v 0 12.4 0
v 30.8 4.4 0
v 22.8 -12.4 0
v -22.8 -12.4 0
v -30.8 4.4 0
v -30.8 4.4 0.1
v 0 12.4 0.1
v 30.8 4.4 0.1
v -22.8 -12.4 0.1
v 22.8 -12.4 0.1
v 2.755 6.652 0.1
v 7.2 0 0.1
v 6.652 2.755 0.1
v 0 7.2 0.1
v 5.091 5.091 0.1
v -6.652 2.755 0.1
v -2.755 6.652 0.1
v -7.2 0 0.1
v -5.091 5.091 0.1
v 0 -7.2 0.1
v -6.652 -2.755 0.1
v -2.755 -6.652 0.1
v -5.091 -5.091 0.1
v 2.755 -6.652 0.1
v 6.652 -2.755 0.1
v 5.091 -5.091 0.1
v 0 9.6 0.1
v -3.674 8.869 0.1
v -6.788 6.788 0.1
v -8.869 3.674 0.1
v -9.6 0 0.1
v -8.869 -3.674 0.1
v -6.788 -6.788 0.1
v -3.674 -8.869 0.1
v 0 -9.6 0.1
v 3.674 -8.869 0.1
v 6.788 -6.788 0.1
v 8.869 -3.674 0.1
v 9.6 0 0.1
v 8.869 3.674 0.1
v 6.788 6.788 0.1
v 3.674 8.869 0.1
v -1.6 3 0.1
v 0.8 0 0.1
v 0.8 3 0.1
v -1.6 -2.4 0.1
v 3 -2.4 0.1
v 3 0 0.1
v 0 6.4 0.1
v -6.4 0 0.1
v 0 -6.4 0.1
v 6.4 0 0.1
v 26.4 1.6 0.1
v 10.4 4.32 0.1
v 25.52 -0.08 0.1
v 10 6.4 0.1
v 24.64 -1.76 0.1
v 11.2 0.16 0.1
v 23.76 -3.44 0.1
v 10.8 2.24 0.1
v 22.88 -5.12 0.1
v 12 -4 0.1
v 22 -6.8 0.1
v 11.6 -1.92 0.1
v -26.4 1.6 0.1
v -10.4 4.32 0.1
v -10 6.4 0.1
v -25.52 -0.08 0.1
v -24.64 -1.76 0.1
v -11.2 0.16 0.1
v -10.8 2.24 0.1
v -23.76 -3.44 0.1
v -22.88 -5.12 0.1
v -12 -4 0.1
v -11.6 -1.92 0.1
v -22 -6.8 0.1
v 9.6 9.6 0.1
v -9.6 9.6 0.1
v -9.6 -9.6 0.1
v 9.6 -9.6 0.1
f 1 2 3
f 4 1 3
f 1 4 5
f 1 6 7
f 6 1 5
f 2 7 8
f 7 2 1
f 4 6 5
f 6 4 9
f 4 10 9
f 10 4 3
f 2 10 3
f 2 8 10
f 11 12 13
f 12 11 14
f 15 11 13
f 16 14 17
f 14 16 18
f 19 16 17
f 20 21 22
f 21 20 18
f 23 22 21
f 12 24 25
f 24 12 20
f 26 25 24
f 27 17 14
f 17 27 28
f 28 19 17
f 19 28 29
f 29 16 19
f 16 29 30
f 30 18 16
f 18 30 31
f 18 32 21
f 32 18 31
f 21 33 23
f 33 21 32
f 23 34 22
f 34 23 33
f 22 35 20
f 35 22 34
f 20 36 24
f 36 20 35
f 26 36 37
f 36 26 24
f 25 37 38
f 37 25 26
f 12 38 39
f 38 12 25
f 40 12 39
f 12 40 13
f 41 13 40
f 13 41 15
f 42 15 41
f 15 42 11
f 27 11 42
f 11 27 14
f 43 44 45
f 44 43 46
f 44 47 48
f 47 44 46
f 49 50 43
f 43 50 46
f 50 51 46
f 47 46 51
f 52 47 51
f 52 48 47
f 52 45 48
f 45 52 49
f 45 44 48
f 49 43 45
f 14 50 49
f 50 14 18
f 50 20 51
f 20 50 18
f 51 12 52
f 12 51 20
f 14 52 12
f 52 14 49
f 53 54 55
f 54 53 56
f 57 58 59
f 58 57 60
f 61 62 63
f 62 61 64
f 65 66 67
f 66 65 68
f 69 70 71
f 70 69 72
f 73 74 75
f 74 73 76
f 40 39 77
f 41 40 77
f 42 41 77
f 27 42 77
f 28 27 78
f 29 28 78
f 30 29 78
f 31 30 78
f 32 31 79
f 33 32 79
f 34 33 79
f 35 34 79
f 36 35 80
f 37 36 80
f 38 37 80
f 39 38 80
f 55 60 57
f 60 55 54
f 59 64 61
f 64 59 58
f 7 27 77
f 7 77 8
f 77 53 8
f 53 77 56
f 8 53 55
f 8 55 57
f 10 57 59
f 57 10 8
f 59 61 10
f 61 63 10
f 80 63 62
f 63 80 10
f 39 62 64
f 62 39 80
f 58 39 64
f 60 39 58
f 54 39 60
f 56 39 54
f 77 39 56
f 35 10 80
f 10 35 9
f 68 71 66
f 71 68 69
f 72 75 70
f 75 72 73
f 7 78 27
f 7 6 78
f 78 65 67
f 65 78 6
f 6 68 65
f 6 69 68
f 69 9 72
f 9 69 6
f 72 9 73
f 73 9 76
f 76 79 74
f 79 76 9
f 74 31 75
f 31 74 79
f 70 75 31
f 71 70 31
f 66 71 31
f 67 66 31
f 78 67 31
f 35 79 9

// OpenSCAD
// file: ../p/4-4edge.scad
use <../lib.scad>
$fa=1; $fs=0.2;
function ldraw_lib__4_4edge(realsolid=false) = [
// 0 Circle 1.0
// 0 Name: 4-4edge.dat
// 0 Author: James Jessiman
// 0 !LDRAW_ORG Primitive UPDATE 2017-01
// 0 !LICENSE Licensed under CC BY 2.0 and CC BY 4.0 : see CAreadme.txt
// 
// 0 BFC CERTIFY CCW
  [0,"BFC","CERTIFY"],
  [0,"BFC","CCW"],
// 
// 0 !HISTORY 1998-12-15 [PTadmin] Official Update 1998-10
// 0 !HISTORY 2005-12-28 [PTadmin] Official Update 2005-01
// 0 !HISTORY 2007-06-24 [PTadmin] Header formatted for Contributor Agreement
// 0 !HISTORY 2008-07-01 [PTadmin] Official Update 2008-01
// 0 !HISTORY 2017-01-15 [Steffen] BFCed
// 0 !HISTORY 2017-12-30 [PTadmin] Official Update 2017-01
// 
// 
// 2 24 1 0 0 0.9239 0 0.3827
  [2,24,1,0,0,0.9239,0,0.3827],
// 2 24 0.9239 0 0.3827 0.7071 0 0.7071
  [2,24,0.9239,0,0.3827,0.7071,0,0.7071],
// 2 24 0.7071 0 0.7071 0.3827 0 0.9239
  [2,24,0.7071,0,0.7071,0.3827,0,0.9239],
// 2 24 0.3827 0 0.9239 0 0 1
  [2,24,0.3827,0,0.9239,0,0,1],
// 2 24 0 0 1 -0.3827 0 0.9239
  [2,24,0,0,1,-0.3827,0,0.9239],
// 2 24 -0.3827 0 0.9239 -0.7071 0 0.7071
  [2,24,-0.3827,0,0.9239,-0.7071,0,0.7071],
// 2 24 -0.7071 0 0.7071 -0.9239 0 0.3827
  [2,24,-0.7071,0,0.7071,-0.9239,0,0.3827],
// 2 24 -0.9239 0 0.3827 -1 0 -0
  [2,24,-0.9239,0,0.3827,-1,0,-0],
// 2 24 -1 0 -0 -0.9239 0 -0.3827
  [2,24,-1,0,-0,-0.9239,0,-0.3827],
// 2 24 -0.9239 0 -0.3827 -0.7071 0 -0.7071
  [2,24,-0.9239,0,-0.3827,-0.7071,0,-0.7071],
// 2 24 -0.7071 0 -0.7071 -0.3827 0 -0.9239
  [2,24,-0.7071,0,-0.7071,-0.3827,0,-0.9239],
// 2 24 -0.3827 0 -0.9239 0 0 -1
  [2,24,-0.3827,0,-0.9239,0,0,-1],
// 2 24 0 0 -1 0.3827 0 -0.9239
  [2,24,0,0,-1,0.3827,0,-0.9239],
// 2 24 0.3827 0 -0.9239 0.7071 0 -0.7071
  [2,24,0.3827,0,-0.9239,0.7071,0,-0.7071],
// 2 24 0.7071 0 -0.7071 0.9239 0 -0.3827
  [2,24,0.7071,0,-0.7071,0.9239,0,-0.3827],
// 2 24 0.9239 0 -0.3827 1 0 0
  [2,24,0.9239,0,-0.3827,1,0,0],
];
module ldraw_lib__4_4edge(step=0, col=false, unit=2/5, alt=false, line=0.2, solid=!$preview)
    makepoly(ldraw_lib__4_4edge(solid), step=step, col=col, unit=unit, alt=alt, line=line, solid=solid);
ldraw_lib__4_4edge(line=0.2);
// file: ../p/4-4disc.scad
use <../lib.scad>
$fa=1; $fs=0.2;
function ldraw_lib__4_4disc(realsolid=false) = [
// 0 Disc 1.0
// 0 Name: 4-4disc.dat
// 0 Author: James Jessiman
// 0 !LDRAW_ORG Primitive UPDATE 2002-02
// 0 !LICENSE Licensed under CC BY 2.0 and CC BY 4.0 : see CAreadme.txt
// 
// 0 BFC CERTIFY CCW
  [0,"BFC","CERTIFY"],
  [0,"BFC","CCW"],
// 
// 0 !HISTORY 1998-12-15 [PTadmin] Official Update 1998-10
// 0 !HISTORY 2002-03-23 [sbliss] Added BFC statement
// 0 !HISTORY 2002-04-25 [PTadmin] Official Update 2002-02
// 0 !HISTORY 2007-06-24 [PTadmin] Header formatted for Contributor Agreement
// 0 !HISTORY 2008-07-01 [PTadmin] Official Update 2008-01
// 
// 
// 3 16 0 0 0 1 0 0 0.9239 0 0.3827
  [3,16,0,0,0,1,0,0,0.9239,0,0.3827],
// 3 16 0 0 0 0.9239 0 0.3827 0.7071 0 0.7071
  [3,16,0,0,0,0.9239,0,0.3827,0.7071,0,0.7071],
// 3 16 0 0 0 0.7071 0 0.7071 0.3827 0 0.9239
  [3,16,0,0,0,0.7071,0,0.7071,0.3827,0,0.9239],
// 3 16 0 0 0 0.3827 0 0.9239 0 0 1
  [3,16,0,0,0,0.3827,0,0.9239,0,0,1],
// 3 16 0 0 0 0 0 1 -0.3827 0 0.9239
  [3,16,0,0,0,0,0,1,-0.3827,0,0.9239],
// 3 16 0 0 0 -0.3827 0 0.9239 -0.7071 0 0.7071
  [3,16,0,0,0,-0.3827,0,0.9239,-0.7071,0,0.7071],
// 3 16 0 0 0 -0.7071 0 0.7071 -0.9239 0 0.3827
  [3,16,0,0,0,-0.7071,0,0.7071,-0.9239,0,0.3827],
// 3 16 0 0 0 -0.9239 0 0.3827 -1 0 -0
  [3,16,0,0,0,-0.9239,0,0.3827,-1,0,-0],
// 3 16 0 0 0 -1 0 -0 -0.9239 0 -0.3827
  [3,16,0,0,0,-1,0,-0,-0.9239,0,-0.3827],
// 3 16 0 0 0 -0.9239 0 -0.3827 -0.7071 0 -0.7071
  [3,16,0,0,0,-0.9239,0,-0.3827,-0.7071,0,-0.7071],
// 3 16 0 0 0 -0.7071 0 -0.7071 -0.3827 0 -0.9239
  [3,16,0,0,0,-0.7071,0,-0.7071,-0.3827,0,-0.9239],
// 3 16 0 0 0 -0.3827 0 -0.9239 0 0 -1
  [3,16,0,0,0,-0.3827,0,-0.9239,0,0,-1],
// 3 16 0 0 0 0 0 -1 0.3827 0 -0.9239
  [3,16,0,0,0,0,0,-1,0.3827,0,-0.9239],
// 3 16 0 0 0 0.3827 0 -0.9239 0.7071 0 -0.7071
  [3,16,0,0,0,0.3827,0,-0.9239,0.7071,0,-0.7071],
// 3 16 0 0 0 0.7071 0 -0.7071 0.9239 0 -0.3827
  [3,16,0,0,0,0.7071,0,-0.7071,0.9239,0,-0.3827],
// 3 16 0 0 0 0.9239 0 -0.3827 1 0 0
  [3,16,0,0,0,0.9239,0,-0.3827,1,0,0],
// 0
];
module ldraw_lib__4_4disc(step=0, col=false, unit=2/5, alt=false, line=0.2, solid=!$preview)
    makepoly(ldraw_lib__4_4disc(solid), step=step, col=col, unit=unit, alt=alt, line=line, solid=solid);
ldraw_lib__4_4disc(line=0.2);
// file: ../p/4-4cyli.scad
use <../lib.scad>
$fa=1; $fs=0.2;
function ldraw_lib__4_4cyli(realsolid=false) = [
// 0 Cylinder 1.0
// 0 Name: 4-4cyli.dat
// 0 Author: James Jessiman
// 0 !LDRAW_ORG Primitive UPDATE 2005-01
// 0 !LICENSE Licensed under CC BY 2.0 and CC BY 4.0 : see CAreadme.txt
// 
// 0 BFC CERTIFY CCW
  [0,"BFC","CERTIFY"],
  [0,"BFC","CCW"],
// 
// 0 !HISTORY 1998-12-15 [PTadmin] Official Update 1998-10
// 0 !HISTORY 2002-03-23 [sbliss] Added BFC statement; merged headers from files in distributions LDraw 0.27 and Complete.
// 0 !HISTORY 2002-04-25 [PTadmin] Official Update 2002-02
// 0 !HISTORY 2004-12-14 [guyvivan] BFC CCW
// 0 !HISTORY 2005-12-28 [PTadmin] Official Update 2005-01
// 0 !HISTORY 2007-06-24 [PTadmin] Header formatted for Contributor Agreement
// 0 !HISTORY 2008-07-01 [PTadmin] Official Update 2008-01
// 
// 
// 4 16 1 1 0 0.9239 1 0.3827 0.9239 0 0.3827 1 0 0
  [4,16,1,1,0,0.9239,1,0.3827,0.9239,0,0.3827,1,0,0],
// 5 24 1 0 0 1 1 0 0.9239 0 0.3827 0.9239 0 -0.3827
  [5,24,1,0,0,1,1,0,0.9239,0,0.3827,0.9239,0,-0.3827],
// 4 16 0.9239 1 0.3827 0.7071 1 0.7071 0.7071 0 0.7071 0.9239 0 0.3827
  [4,16,0.9239,1,0.3827,0.7071,1,0.7071,0.7071,0,0.7071,0.9239,0,0.3827],
// 5 24 0.9239 0 0.3827 0.9239 1 0.3827 0.7071 0 0.7071 1 0 0
  [5,24,0.9239,0,0.3827,0.9239,1,0.3827,0.7071,0,0.7071,1,0,0],
// 4 16 0.7071 1 0.7071 0.3827 1 0.9239 0.3827 0 0.9239 0.7071 0 0.7071
  [4,16,0.7071,1,0.7071,0.3827,1,0.9239,0.3827,0,0.9239,0.7071,0,0.7071],
// 5 24 0.7071 0 0.7071 0.7071 1 0.7071 0.3827 0 0.9239 0.9239 0 0.3827
  [5,24,0.7071,0,0.7071,0.7071,1,0.7071,0.3827,0,0.9239,0.9239,0,0.3827],
// 4 16 0.3827 1 0.9239 0 1 1 0 0 1 0.3827 0 0.9239
  [4,16,0.3827,1,0.9239,0,1,1,0,0,1,0.3827,0,0.9239],
// 5 24 0.3827 0 0.9239 0.3827 1 0.9239 0 0 1 0.7071 0 0.7071
  [5,24,0.3827,0,0.9239,0.3827,1,0.9239,0,0,1,0.7071,0,0.7071],
// 4 16 0 1 1 -0.3827 1 0.9239 -0.3827 0 0.9239 0 0 1
  [4,16,0,1,1,-0.3827,1,0.9239,-0.3827,0,0.9239,0,0,1],
// 5 24 0 0 1 0 1 1 -0.3827 0 0.9239 0.3827 0 0.9239
  [5,24,0,0,1,0,1,1,-0.3827,0,0.9239,0.3827,0,0.9239],
// 4 16 -0.3827 1 0.9239 -0.7071 1 0.7071 -0.7071 0 0.7071 -0.3827 0 0.9239
  [4,16,-0.3827,1,0.9239,-0.7071,1,0.7071,-0.7071,0,0.7071,-0.3827,0,0.9239],
// 5 24 -0.3827 0 0.9239 -0.3827 1 0.9239 -0.7071 0 0.7071 0 0 1
  [5,24,-0.3827,0,0.9239,-0.3827,1,0.9239,-0.7071,0,0.7071,0,0,1],
// 4 16 -0.7071 1 0.7071 -0.9239 1 0.3827 -0.9239 0 0.3827 -0.7071 0 0.7071
  [4,16,-0.7071,1,0.7071,-0.9239,1,0.3827,-0.9239,0,0.3827,-0.7071,0,0.7071],
// 5 24 -0.7071 0 0.7071 -0.7071 1 0.7071 -0.9239 0 0.3827 -0.3827 0 0.9239
  [5,24,-0.7071,0,0.7071,-0.7071,1,0.7071,-0.9239,0,0.3827,-0.3827,0,0.9239],
// 4 16 -0.9239 1 0.3827 -1 1 0 -1 0 0 -0.9239 0 0.3827
  [4,16,-0.9239,1,0.3827,-1,1,0,-1,0,0,-0.9239,0,0.3827],
// 5 24 -0.9239 0 0.3827 -0.9239 1 0.3827 -1 0 0 -0.7071 0 0.7071
  [5,24,-0.9239,0,0.3827,-0.9239,1,0.3827,-1,0,0,-0.7071,0,0.7071],
// 4 16 -1 1 0 -0.9239 1 -0.3827 -0.9239 0 -0.3827 -1 0 0
  [4,16,-1,1,0,-0.9239,1,-0.3827,-0.9239,0,-0.3827,-1,0,0],
// 5 24 -1 0 0 -1 1 0 -0.9239 0 -0.3827 -0.9239 0 0.3827
  [5,24,-1,0,0,-1,1,0,-0.9239,0,-0.3827,-0.9239,0,0.3827],
// 4 16 -0.9239 1 -0.3827 -0.7071 1 -0.7071 -0.7071 0 -0.7071 -0.9239 0 -0.3827
  [4,16,-0.9239,1,-0.3827,-0.7071,1,-0.7071,-0.7071,0,-0.7071,-0.9239,0,-0.3827],
// 5 24 -0.9239 0 -0.3827 -0.9239 1 -0.3827 -0.7071 0 -0.7071 -1 0 0
  [5,24,-0.9239,0,-0.3827,-0.9239,1,-0.3827,-0.7071,0,-0.7071,-1,0,0],
// 4 16 -0.7071 1 -0.7071 -0.3827 1 -0.9239 -0.3827 0 -0.9239 -0.7071 0 -0.7071
  [4,16,-0.7071,1,-0.7071,-0.3827,1,-0.9239,-0.3827,0,-0.9239,-0.7071,0,-0.7071],
// 5 24 -0.7071 0 -0.7071 -0.7071 1 -0.7071 -0.3827 0 -0.9239 -0.9239 0 -0.3827
  [5,24,-0.7071,0,-0.7071,-0.7071,1,-0.7071,-0.3827,0,-0.9239,-0.9239,0,-0.3827],
// 4 16 -0.3827 1 -0.9239 0 1 -1 0 0 -1 -0.3827 0 -0.9239
  [4,16,-0.3827,1,-0.9239,0,1,-1,0,0,-1,-0.3827,0,-0.9239],
// 5 24 -0.3827 0 -0.9239 -0.3827 1 -0.9239 0 0 -1 -0.7071 0 -0.7071
  [5,24,-0.3827,0,-0.9239,-0.3827,1,-0.9239,0,0,-1,-0.7071,0,-0.7071],
// 4 16 0 1 -1 0.3827 1 -0.9239 0.3827 0 -0.9239 0 0 -1
  [4,16,0,1,-1,0.3827,1,-0.9239,0.3827,0,-0.9239,0,0,-1],
// 5 24 0 0 -1 0 1 -1 0.3827 0 -0.9239 -0.3827 0 -0.9239
  [5,24,0,0,-1,0,1,-1,0.3827,0,-0.9239,-0.3827,0,-0.9239],
// 4 16 0.3827 1 -0.9239 0.7071 1 -0.7071 0.7071 0 -0.7071 0.3827 0 -0.9239
  [4,16,0.3827,1,-0.9239,0.7071,1,-0.7071,0.7071,0,-0.7071,0.3827,0,-0.9239],
// 5 24 0.3827 0 -0.9239 0.3827 1 -0.9239 0.7071 0 -0.7071 0 0 -1
  [5,24,0.3827,0,-0.9239,0.3827,1,-0.9239,0.7071,0,-0.7071,0,0,-1],
// 4 16 0.7071 1 -0.7071 0.9239 1 -0.3827 0.9239 0 -0.3827 0.7071 0 -0.7071
  [4,16,0.7071,1,-0.7071,0.9239,1,-0.3827,0.9239,0,-0.3827,0.7071,0,-0.7071],
// 5 24 0.7071 0 -0.7071 0.7071 1 -0.7071 0.9239 0 -0.3827 0.3827 0 -0.9239
  [5,24,0.7071,0,-0.7071,0.7071,1,-0.7071,0.9239,0,-0.3827,0.3827,0,-0.9239],
// 4 16 0.9239 1 -0.3827 1 1 0 1 0 0 0.9239 0 -0.3827
  [4,16,0.9239,1,-0.3827,1,1,0,1,0,0,0.9239,0,-0.3827],
// 5 24 0.9239 0 -0.3827 0.9239 1 -0.3827 1 0 0 0.7071 0 -0.7071
  [5,24,0.9239,0,-0.3827,0.9239,1,-0.3827,1,0,0,0.7071,0,-0.7071],
// 0
];
module ldraw_lib__4_4cyli(step=0, col=false, unit=2/5, alt=false, line=0.2, solid=!$preview)
    makepoly(ldraw_lib__4_4cyli(solid), step=step, col=col, unit=unit, alt=alt, line=line, solid=solid);
ldraw_lib__4_4cyli(line=0.2);
// file: ../p/stud3.scad
use <../lib.scad>
use <4-4cyli.scad>
use <4-4disc.scad>
use <4-4edge.scad>
$fa=1; $fs=0.2;
function ldraw_lib__stud3(realsolid=false) = realsolid ? 
    [openscad(translate([0,0,-eps()], o=cylinder(4+eps(), r=4)),2)] : [
// 0 Stud Tube Solid
// 0 Name: stud3.dat
// 0 Author: James Jessiman
// 0 !LDRAW_ORG Primitive UPDATE 2012-01
// 0 !LICENSE Licensed under CC BY 2.0 and CC BY 4.0 : see CAreadme.txt
// 
// 0 BFC CERTIFY CCW
  [0,"BFC","CERTIFY"],
  [0,"BFC","CCW"],
// 
// 0 !HISTORY 2002-04-04 [sbliss] Modified for BFC compliance
// 0 !HISTORY 2002-04-25 [PTadmin] Official Update 2002-02
// 0 !HISTORY 2007-06-24 [PTadmin] Header formatted for Contributor Agreement
// 0 !HISTORY 2008-07-01 [PTadmin] Official Update 2008-01
// 0 !HISTORY 2012-02-16 [Philo] Changed to CCW
// 0 !HISTORY 2012-03-30 [PTadmin] Official Update 2012-01
// 
// 
// 1 16 0 -4 0 4 0 0 0 1 0 0 0 4 4-4edge.dat
  [1,16,0,-4,0,4,0,0,0,1,0,0,0,4, ldraw_lib__4_4edge(realsolid)],
// 1 16 0 0 0 4 0 0 0 1 0 0 0 4 4-4edge.dat
  [1,16,0,0,0,4,0,0,0,1,0,0,0,4, ldraw_lib__4_4edge(realsolid)],
// 1 16 0 -4 0 4 0 0 0 1 0 0 0 4 4-4disc.dat
  [1,16,0,-4,0,4,0,0,0,1,0,0,0,4, ldraw_lib__4_4disc(realsolid)],
// 1 16 0 -4 0 4 0 0 0 4 0 0 0 4 4-4cyli.dat
  [1,16,0,-4,0,4,0,0,0,4,0,0,0,4, ldraw_lib__4_4cyli(realsolid)],
];
module ldraw_lib__stud3(step=0, col=false, unit=2/5, alt=false, line=0.2, solid=!$preview)
    makepoly(ldraw_lib__stud3(solid), step=step, col=col, unit=unit, alt=alt, line=line, solid=solid);
ldraw_lib__stud3(line=0.2);
// file: ../p/stud.scad
use <../lib.scad>
use <4-4cyli.scad>
use <4-4disc.scad>
use <4-4edge.scad>
$fa=1; $fs=0.2;
function ldraw_lib__stud(realsolid=false) = realsolid ? 
    [openscad(translate([0,0,-eps()], o=cylinder(4+eps(), r=6)),2)] : [
// 0 Stud
// 0 Name: stud.dat
// 0 Author: James Jessiman
// 0 !LDRAW_ORG Primitive UPDATE 2012-01
// 0 !LICENSE Licensed under CC BY 2.0 and CC BY 4.0 : see CAreadme.txt
// 
// 0 BFC CERTIFY CCW
  [0,"BFC","CERTIFY"],
  [0,"BFC","CCW"],
// 
// 0 !HISTORY 2002-04-04 [sbliss] Modified for BFC compliance
// 0 !HISTORY 2002-04-25 [PTadmin] Official Update 2002-02
// 0 !HISTORY 2007-06-24 [PTadmin] Header formatted for Contributor Agreement
// 0 !HISTORY 2008-07-01 [PTadmin] Official Update 2008-01
// 0 !HISTORY 2012-02-16 [Philo] Changed to CCW
// 0 !HISTORY 2012-03-30 [PTadmin] Official Update 2012-01
// 
// 
// 1 16 0 0 0 6 0 0 0 1 0 0 0 6 4-4edge.dat
  [1,16,0,0,0,6,0,0,0,1,0,0,0,6, ldraw_lib__4_4edge(realsolid)],
// 1 16 0 -4 0 6 0 0 0 1 0 0 0 6 4-4edge.dat
  [1,16,0,-4,0,6,0,0,0,1,0,0,0,6, ldraw_lib__4_4edge(realsolid)],
// 1 16 0 0 0 6 0 0 0 -4 0 0 0 6 4-4cyli.dat
  [1,16,0,0,0,6,0,0,0,-4,0,0,0,6, ldraw_lib__4_4cyli(realsolid)],
// 1 16 0 -4 0 6 0 0 0 1 0 0 0 6 4-4disc.dat
  [1,16,0,-4,0,6,0,0,0,1,0,0,0,6, ldraw_lib__4_4disc(realsolid)],
];
module ldraw_lib__stud(step=0, col=false, unit=2/5, alt=false, line=0.2, solid=!$preview)
    makepoly(ldraw_lib__stud(solid), step=step, col=col, unit=unit, alt=alt, line=line, solid=solid);
ldraw_lib__stud(line=0.2);
// file: ../p/box5.scad
use <../lib.scad>
$fa=1; $fs=0.2;
function ldraw_lib__box5(realsolid=false) = [
// 0 Box with 5 Faces and All Edges
// 0 Name: box5.dat
// 0 Author: James Jessiman
// 0 !LDRAW_ORG Primitive UPDATE 2012-01
// 0 !LICENSE Licensed under CC BY 2.0 and CC BY 4.0 : see CAreadme.txt
// 
// 0 BFC CERTIFY CCW
  [0,"BFC","CERTIFY"],
  [0,"BFC","CCW"],
// 
// 0 !HISTORY 2002-04-03 [sbliss] Modified for BFC compliance
// 0 !HISTORY 2002-04-25 [PTadmin] Official Update 2002-02
// 0 !HISTORY 2007-06-24 [PTadmin] Header formatted for Contributor Agreement
// 0 !HISTORY 2008-07-01 [PTadmin] Official Update 2008-01
// 0 !HISTORY 2012-02-16 [Philo] Changed to CCW
// 0 !HISTORY 2012-03-30 [PTadmin] Official Update 2012-01
// 
// 
// 2 24 1 1 1 -1 1 1
  [2,24,1,1,1,-1,1,1],
// 2 24 -1 1 1 -1 1 -1
  [2,24,-1,1,1,-1,1,-1],
// 2 24 -1 1 -1 1 1 -1
  [2,24,-1,1,-1,1,1,-1],
// 2 24 1 1 -1 1 1 1
  [2,24,1,1,-1,1,1,1],
// 2 24 1 0 1 -1 0 1
  [2,24,1,0,1,-1,0,1],
// 2 24 -1 0 1 -1 0 -1
  [2,24,-1,0,1,-1,0,-1],
// 2 24 -1 0 -1 1 0 -1
  [2,24,-1,0,-1,1,0,-1],
// 2 24 1 0 -1 1 0 1
  [2,24,1,0,-1,1,0,1],
// 2 24 1 0 1 1 1 1
  [2,24,1,0,1,1,1,1],
// 2 24 -1 0 1 -1 1 1
  [2,24,-1,0,1,-1,1,1],
// 2 24 1 0 -1 1 1 -1
  [2,24,1,0,-1,1,1,-1],
// 2 24 -1 0 -1 -1 1 -1
  [2,24,-1,0,-1,-1,1,-1],
// 4 16 -1 1 1 1 1 1 1 1 -1 -1 1 -1
  [4,16,-1,1,1,1,1,1,1,1,-1,-1,1,-1],
// 4 16 -1 1 1 -1 0 1 1 0 1 1 1 1
  [4,16,-1,1,1,-1,0,1,1,0,1,1,1,1],
// 4 16 -1 1 -1 -1 0 -1 -1 0 1 -1 1 1
  [4,16,-1,1,-1,-1,0,-1,-1,0,1,-1,1,1],
// 4 16 1 1 -1 1 0 -1 -1 0 -1 -1 1 -1
  [4,16,1,1,-1,1,0,-1,-1,0,-1,-1,1,-1],
// 4 16 1 1 1 1 0 1 1 0 -1 1 1 -1
  [4,16,1,1,1,1,0,1,1,0,-1,1,1,-1],
];
module ldraw_lib__box5(step=0, col=false, unit=2/5, alt=false, line=0.2, solid=!$preview)
    makepoly(ldraw_lib__box5(solid), step=step, col=col, unit=unit, alt=alt, line=line, solid=solid);
ldraw_lib__box5(line=0.2);
// file: ../p/box4t.scad
use <../lib.scad>
$fa=1; $fs=0.2;
function ldraw_lib__box4t(realsolid=false) = [
// 0 Box with 4 Adjacent Faces and All Edges
// 0 Name: box4t.dat
// 0 Author: Tore Eriksson [Tore_Eriksson]
// 0 !LDRAW_ORG Primitive UPDATE 2003-02
// 0 !LICENSE Licensed under CC BY 2.0 and CC BY 4.0 : see CAreadme.txt
// 
// 0 BFC CERTIFY CCW
  [0,"BFC","CERTIFY"],
  [0,"BFC","CCW"],
// 
// 0 !HISTORY 1997-09-29 [PTadmin] Official Update 1997-15
// 0 !HISTORY 2002-08-31 [izanette] Modified with WINDZ for BFC compliance
// 0 !HISTORY 2003-08-01 [PTadmin] Official Update 2003-02
// 0 !HISTORY 2007-06-24 [PTadmin] Header formatted for Contributor Agreement
// 0 !HISTORY 2008-07-01 [PTadmin] Official Update 2008-01
// 
// 
// 2 24 1 1 1 -1 1 1
  [2,24,1,1,1,-1,1,1],
// 2 24 -1 1 1 -1 1 -1
  [2,24,-1,1,1,-1,1,-1],
// 2 24 -1 1 -1 1 1 -1
  [2,24,-1,1,-1,1,1,-1],
// 2 24 1 1 -1 1 1 1
  [2,24,1,1,-1,1,1,1],
// 2 24 1 0 1 -1 0 1
  [2,24,1,0,1,-1,0,1],
// 2 24 -1 0 1 -1 0 -1
  [2,24,-1,0,1,-1,0,-1],
// 2 24 -1 0 -1 1 0 -1
  [2,24,-1,0,-1,1,0,-1],
// 2 24 1 0 -1 1 0 1
  [2,24,1,0,-1,1,0,1],
// 2 24 1 0 1 1 1 1
  [2,24,1,0,1,1,1,1],
// 2 24 -1 0 1 -1 1 1
  [2,24,-1,0,1,-1,1,1],
// 2 24 1 0 -1 1 1 -1
  [2,24,1,0,-1,1,1,-1],
// 2 24 -1 0 -1 -1 1 -1
  [2,24,-1,0,-1,-1,1,-1],
// 4 16 1 1 1 1 1 -1 -1 1 -1 -1 1 1
  [4,16,1,1,1,1,1,-1,-1,1,-1,-1,1,1],
// 4 16 1 1 1 -1 1 1 -1 0 1 1 0 1
  [4,16,1,1,1,-1,1,1,-1,0,1,1,0,1],
// 4 16 -1 1 1 -1 1 -1 -1 0 -1 -1 0 1
  [4,16,-1,1,1,-1,1,-1,-1,0,-1,-1,0,1],
// 0 4 16 -1 1 -1 -1 0 -1 1 0 -1 1 1 -1
// 4 16 1 1 -1 1 1 1 1 0 1 1 0 -1
  [4,16,1,1,-1,1,1,1,1,0,1,1,0,-1],
// 0
];
module ldraw_lib__box4t(step=0, col=false, unit=2/5, alt=false, line=0.2, solid=!$preview)
    makepoly(ldraw_lib__box4t(solid), step=step, col=col, unit=unit, alt=alt, line=line, solid=solid);
ldraw_lib__box4t(line=0.2);
// file: s/3004s01.scad
use <../../lib.scad>
use <../../p/box4t.scad>
use <../../p/box5.scad>
use <../../p/stud.scad>
use <../../p/stud3.scad>
$fa=1; $fs=0.2;
function ldraw_lib__s__3004s01(realsolid=false) = [
// 0 ~Brick  1 x  2 without Front Face
// 0 Name: s\3004s01.dat
// 0 Author: James Jessiman
// 0 !LDRAW_ORG Subpart UPDATE 2003-03
// 0 !LICENSE Licensed under CC BY 2.0 and CC BY 4.0 : see CAreadme.txt
// 
// 0 BFC CERTIFY CCW
  [0,"BFC","CERTIFY"],
  [0,"BFC","CCW"],
// 
// 0 !HISTORY 2003-09-07 [jriley] Subfiling, BFC
// 0 !HISTORY 2003-12-19 [PTadmin] Official Update 2003-03
// 0 !HISTORY 2007-08-29 [PTadmin] Header formatted for Contributor Agreement
// 0 !HISTORY 2008-07-01 [PTadmin] Official Update 2008-01
// 
// 
// 1 16 0 4 0 1 0 0 0 -5 0 0 0 1 stud3.dat
  [1,16,0,4,0,1,0,0,0,-5,0,0,0,1, ldraw_lib__stud3(realsolid)],
// 0 BFC INVERTNEXT
  [0,"BFC","INVERTNEXT"],
// 1 16 0 24 0 16 0 0 0 -20 0 0 0 6 box5.dat
  [1,16,0,24,0,16,0,0,0,-20,0,0,0,6, ldraw_lib__box5(realsolid)],
// 4 16 20 24 10 16 24 6 -16 24 6 -20 24 10
  [4,16,20,24,10,16,24,6,-16,24,6,-20,24,10],
// 4 16 -20 24 10 -16 24 6 -16 24 -6 -20 24 -10
  [4,16,-20,24,10,-16,24,6,-16,24,-6,-20,24,-10],
// 4 16 -20 24 -10 -16 24 -6 16 24 -6 20 24 -10
  [4,16,-20,24,-10,-16,24,-6,16,24,-6,20,24,-10],
// 4 16 20 24 -10 16 24 -6 16 24 6 20 24 10
  [4,16,20,24,-10,16,24,-6,16,24,6,20,24,10],
// 1 16 0 24 0 20 0 0 0 -24 0 0 0 10 box4t.dat
  [1,16,0,24,0,20,0,0,0,-24,0,0,0,10, ldraw_lib__box4t(realsolid)],
// 1 16 10 0 0 1 0 0 0 1 0 0 0 1 stud.dat
  [1,16,10,0,0,1,0,0,0,1,0,0,0,1, ldraw_lib__stud(realsolid)],
// 1 16 -10 0 0 1 0 0 0 1 0 0 0 1 stud.dat
  [1,16,-10,0,0,1,0,0,0,1,0,0,0,1, ldraw_lib__stud(realsolid)],
// 0
];
module ldraw_lib__s__3004s01(step=0, col=false, unit=2/5, alt=false, line=0.2, solid=!$preview)
    makepoly(ldraw_lib__s__3004s01(solid), step=step, col=col, unit=unit, alt=alt, line=line, solid=solid);
ldraw_lib__s__3004s01(line=0.2);
// file: 3004.scad
use <../lib.scad>
use <s/3004s01.scad>
$fa=1; $fs=0.2;
function ldraw_lib__3004(realsolid=false) = [
// 0 Brick  1 x  2
// 0 Name: 3004.dat
// 0 Author: James Jessiman
// 0 !LDRAW_ORG Part UPDATE 2022-05
// 0 !LICENSE Licensed under CC BY 2.0 and CC BY 4.0 : see CAreadme.txt
// 
// 0 BFC CERTIFY CCW
  [0,"BFC","CERTIFY"],
  [0,"BFC","CCW"],
// 
// 0 !HISTORY 2001-10-26 [PTadmin] Official Update 2001-01
// 0 !HISTORY 2002-05-07 {unknown} BFC Certification
// 0 !HISTORY 2002-06-11 [PTadmin] Official Update 2002-03
// 0 !HISTORY 2007-05-07 [PTadmin] Header formatted for Contributor Agreement
// 0 !HISTORY 2008-07-01 [PTadmin] Official Update 2008-01
// 0 !HISTORY 2022-08-04 [MagFors] Using subfile
// 0 !HISTORY 2022-09-15 [PTadmin] Official Update 2022-05
// 
// 
// 1 16 0 0 0 1 0 0 0 1 0 0 0 1 s\3004s01.dat
  [1,16,0,0,0,1,0,0,0,1,0,0,0,1, ldraw_lib__s__3004s01(realsolid)],
// 4 16 -20 24 -10 20 24 -10 20 0 -10 -20 0 -10
  [4,16,-20,24,-10,20,24,-10,20,0,-10,-20,0,-10],
];
module ldraw_lib__3004(step=0, col=false, unit=2/5, alt=false, line=0.2, solid=!$preview)
    makepoly(ldraw_lib__3004(solid), step=step, col=col, unit=unit, alt=alt, line=line, solid=solid);
ldraw_lib__3004(line=0.2);
// file: ../p/4-4ring3.scad
use <../lib.scad>
$fa=1; $fs=0.2;
function ldraw_lib__4_4ring3(realsolid=false) = [
// 0 Ring  3 x 1.0
// 0 Name: 4-4ring3.dat
// 0 Author: James Jessiman
// 0 !LDRAW_ORG Primitive UPDATE 2009-01
// 0 !LICENSE Licensed under CC BY 2.0 and CC BY 4.0 : see CAreadme.txt
// 
// 0 BFC CERTIFY CCW
  [0,"BFC","CERTIFY"],
  [0,"BFC","CCW"],
// 
// 0 !HISTORY 1998-12-15 [PTadmin] Official Update 1998-10
// 0 !HISTORY 2002-04-05 [hafhead] Added BFC statement
// 0 !HISTORY 2002-04-25 [PTadmin] Official Update 2002-02
// 0 !HISTORY 2007-06-24 [PTadmin] Header formatted for Contributor Agreement
// 0 !HISTORY 2008-07-01 [PTadmin] Official Update 2008-01
// 0 !HISTORY 2008-08-26 [cwdee] Switch polygon winding and rename
// 0 !HISTORY 2009-05-02 [PTadmin] Official Update 2009-01
// 
// 
// 4 16 -1.5308 0 3.6956 -1.1481 0 2.7717 0 0 3 0 0 4
  [4,16,-1.5308,0,3.6956,-1.1481,0,2.7717,0,0,3,0,0,4],
// 4 16 -2.8284 0 2.8284 -2.1213 0 2.1213 -1.1481 0 2.7717 -1.5308 0 3.6956
  [4,16,-2.8284,0,2.8284,-2.1213,0,2.1213,-1.1481,0,2.7717,-1.5308,0,3.6956],
// 4 16 -3.6956 0 1.5308 -2.7717 0 1.1481 -2.1213 0 2.1213 -2.8284 0 2.8284
  [4,16,-3.6956,0,1.5308,-2.7717,0,1.1481,-2.1213,0,2.1213,-2.8284,0,2.8284],
// 4 16 -4 0 0 -3 0 0 -2.7717 0 1.1481 -3.6956 0 1.5308
  [4,16,-4,0,0,-3,0,0,-2.7717,0,1.1481,-3.6956,0,1.5308],
// 4 16 -3.6956 0 -1.5308 -2.7717 0 -1.1481 -3 0 0 -4 0 0
  [4,16,-3.6956,0,-1.5308,-2.7717,0,-1.1481,-3,0,0,-4,0,0],
// 4 16 -2.8284 0 -2.8284 -2.1213 0 -2.1213 -2.7717 0 -1.1481 -3.6956 0 -1.5308
  [4,16,-2.8284,0,-2.8284,-2.1213,0,-2.1213,-2.7717,0,-1.1481,-3.6956,0,-1.5308],
// 4 16 -1.5308 0 -3.6956 -1.1481 0 -2.7717 -2.1213 0 -2.1213 -2.8284 0 -2.8284
  [4,16,-1.5308,0,-3.6956,-1.1481,0,-2.7717,-2.1213,0,-2.1213,-2.8284,0,-2.8284],
// 4 16 0 0 -4 0 0 -3 -1.1481 0 -2.7717 -1.5308 0 -3.6956
  [4,16,0,0,-4,0,0,-3,-1.1481,0,-2.7717,-1.5308,0,-3.6956],
// 4 16 1.5308 0 -3.6956 1.1481 0 -2.7717 0 0 -3 0 0 -4
  [4,16,1.5308,0,-3.6956,1.1481,0,-2.7717,0,0,-3,0,0,-4],
// 4 16 2.8284 0 -2.8284 2.1213 0 -2.1213 1.1481 0 -2.7717 1.5308 0 -3.6956
  [4,16,2.8284,0,-2.8284,2.1213,0,-2.1213,1.1481,0,-2.7717,1.5308,0,-3.6956],
// 4 16 3.6956 0 -1.5308 2.7717 0 -1.1481 2.1213 0 -2.1213 2.8284 0 -2.8284
  [4,16,3.6956,0,-1.5308,2.7717,0,-1.1481,2.1213,0,-2.1213,2.8284,0,-2.8284],
// 4 16 4 0 0 3 0 0 2.7717 0 -1.1481 3.6956 0 -1.5308
  [4,16,4,0,0,3,0,0,2.7717,0,-1.1481,3.6956,0,-1.5308],
// 4 16 3.6956 0 1.5308 2.7717 0 1.1481 3 0 0 4 0 0
  [4,16,3.6956,0,1.5308,2.7717,0,1.1481,3,0,0,4,0,0],
// 4 16 2.8284 0 2.8284 2.1213 0 2.1213 2.7717 0 1.1481 3.6956 0 1.5308
  [4,16,2.8284,0,2.8284,2.1213,0,2.1213,2.7717,0,1.1481,3.6956,0,1.5308],
// 4 16 1.5308 0 3.6956 1.1481 0 2.7717 2.1213 0 2.1213 2.8284 0 2.8284
  [4,16,1.5308,0,3.6956,1.1481,0,2.7717,2.1213,0,2.1213,2.8284,0,2.8284],
// 4 16 0 0 4 0 0 3 1.1481 0 2.7717 1.5308 0 3.6956
  [4,16,0,0,4,0,0,3,1.1481,0,2.7717,1.5308,0,3.6956],
// 0
];
module ldraw_lib__4_4ring3(step=0, col=false, unit=2/5, alt=false, line=0.2, solid=!$preview)
    makepoly(ldraw_lib__4_4ring3(solid), step=step, col=col, unit=unit, alt=alt, line=line, solid=solid);
ldraw_lib__4_4ring3(line=0.2);
// file: ../p/4-4ndis.scad
use <../lib.scad>
$fa=1; $fs=0.2;
function ldraw_lib__4_4ndis(realsolid=false) = [
// 0 Disc Negative 1.0
// 0 Name: 4-4ndis.dat
// 0 Author: James Jessiman
// 0 !LDRAW_ORG Primitive UPDATE 2012-01
// 0 !LICENSE Licensed under CC BY 2.0 and CC BY 4.0 : see CAreadme.txt
// 
// 0 BFC CERTIFY CCW
  [0,"BFC","CERTIFY"],
  [0,"BFC","CCW"],
// 
// 0 !HISTORY 2002-03-23 [sbliss] Added BFC statement; compacted code
// 0 !HISTORY 2002-04-25 [PTadmin] Official Update 2002-02
// 0 !HISTORY 2007-06-24 [PTadmin] Header formatted for Contributor Agreement
// 0 !HISTORY 2008-07-01 [PTadmin] Official Update 2008-01
// 0 !HISTORY 2012-02-16 [Philo] Changed to CCW
// 0 !HISTORY 2012-03-30 [PTadmin] Official Update 2012-01
// 
// 
// 3 16 0.9239 0 0.3827 1 0 0 1 0 1
  [3,16,0.9239,0,0.3827,1,0,0,1,0,1],
// 3 16 0.7071 0 0.7071 0.9239 0 0.3827 1 0 1
  [3,16,0.7071,0,0.7071,0.9239,0,0.3827,1,0,1],
// 3 16 0.3827 0 0.9239 0.7071 0 0.7071 1 0 1
  [3,16,0.3827,0,0.9239,0.7071,0,0.7071,1,0,1],
// 3 16 0 0 1 0.3827 0 0.9239 1 0 1
  [3,16,0,0,1,0.3827,0,0.9239,1,0,1],
// 3 16 -0.3827 0 0.9239 0 0 1 -1 0 1
  [3,16,-0.3827,0,0.9239,0,0,1,-1,0,1],
// 3 16 -0.7071 0 0.7071 -0.3827 0 0.9239 -1 0 1
  [3,16,-0.7071,0,0.7071,-0.3827,0,0.9239,-1,0,1],
// 3 16 -0.9239 0 0.3827 -0.7071 0 0.7071 -1 0 1
  [3,16,-0.9239,0,0.3827,-0.7071,0,0.7071,-1,0,1],
// 3 16 -1 0 0 -0.9239 0 0.3827 -1 0 1
  [3,16,-1,0,0,-0.9239,0,0.3827,-1,0,1],
// 3 16 -0.9239 0 -0.3827 -1 0 0 -1 0 -1
  [3,16,-0.9239,0,-0.3827,-1,0,0,-1,0,-1],
// 3 16 -0.7071 0 -0.7071 -0.9239 0 -0.3827 -1 0 -1
  [3,16,-0.7071,0,-0.7071,-0.9239,0,-0.3827,-1,0,-1],
// 3 16 -0.3827 0 -0.9239 -0.7071 0 -0.7071 -1 0 -1
  [3,16,-0.3827,0,-0.9239,-0.7071,0,-0.7071,-1,0,-1],
// 3 16 0 0 -1 -0.3827 0 -0.9239 -1 0 -1
  [3,16,0,0,-1,-0.3827,0,-0.9239,-1,0,-1],
// 3 16 0.3827 0 -0.9239 0 0 -1 1 0 -1
  [3,16,0.3827,0,-0.9239,0,0,-1,1,0,-1],
// 3 16 0.7071 0 -0.7071 0.3827 0 -0.9239 1 0 -1
  [3,16,0.7071,0,-0.7071,0.3827,0,-0.9239,1,0,-1],
// 3 16 0.9239 0 -0.3827 0.7071 0 -0.7071 1 0 -1
  [3,16,0.9239,0,-0.3827,0.7071,0,-0.7071,1,0,-1],
// 3 16 1 0 0 0.9239 0 -0.3827 1 0 -1
  [3,16,1,0,0,0.9239,0,-0.3827,1,0,-1],
];
module ldraw_lib__4_4ndis(step=0, col=false, unit=2/5, alt=false, line=0.2, solid=!$preview)
    makepoly(ldraw_lib__4_4ndis(solid), step=step, col=col, unit=unit, alt=alt, line=line, solid=solid);
ldraw_lib__4_4ndis(line=0.2);
// file: ../p/1-4chrd.scad
use <../lib.scad>
$fa=1; $fs=0.2;
function ldraw_lib__1_4chrd(realsolid=false) = [
// 0 Chord 0.25
// 0 Name: 1-4chrd.dat
// 0 Author: Tony Hafner [hafhead]
// 0 !LDRAW_ORG Primitive UPDATE 2012-02
// 0 !LICENSE Licensed under CC BY 2.0 and CC BY 4.0 : see CAreadme.txt
// 
// 0 BFC CERTIFY CCW
  [0,"BFC","CERTIFY"],
  [0,"BFC","CCW"],
// 
// 0 !HISTORY 2004-04-22 [PTadmin] Official Update 2004-02
// 0 !HISTORY 2007-10-09 [PTadmin] Header formatted for Contributor Agreement
// 0 !HISTORY 2008-07-01 [PTadmin] Official Update 2008-01
// 0 !HISTORY 2012-08-02 [MMR1988] Re-creation with PrimGen2 and Rectifier
// 0 !HISTORY 2012-08-09 [PTadmin] Official Update 2012-02
// 
// 
// 4 16 0.9239 0 0.3827 0.3827 0 0.9239 0 0 1 1 0 0
  [4,16,0.9239,0,0.3827,0.3827,0,0.9239,0,0,1,1,0,0],
// 3 16 0.7071 0 0.7071 0.3827 0 0.9239 0.9239 0 0.3827
  [3,16,0.7071,0,0.7071,0.3827,0,0.9239,0.9239,0,0.3827],
];
module ldraw_lib__1_4chrd(step=0, col=false, unit=2/5, alt=false, line=0.2, solid=!$preview)
    makepoly(ldraw_lib__1_4chrd(solid), step=step, col=col, unit=unit, alt=alt, line=line, solid=solid);
ldraw_lib__1_4chrd(line=0.2);
// main file
use <../lib.scad>
use <../p/1-4chrd.scad>
use <../p/4-4ndis.scad>
use <../p/4-4ring3.scad>
$fa=1; $fs=0.2;
function ldraw_lib__194175a(realsolid=false) = [
// 0 Sticker  3.1 x  7.7 Pentagon with White Stripes and Red "L" in White/Black/Orange Logo
// 0 Name: 194175a.dat
// 0 Author: Takeshi Takahashi [RainbowDolphin]
// 0 !LDRAW_ORG Part UPDATE 2022-05
// 0 !LICENSE Licensed under CC BY 2.0 and CC BY 4.0 : see CAreadme.txt
// 
// 0 BFC CERTIFY CCW
  [0,"BFC","CERTIFY"],
  [0,"BFC","CCW"],
// 
// 0 !KEYWORDS Set 4005, Ship emblem, Tug boat
// 
// 0 !HISTORY 2022-09-15 [PTadmin] Official Update 2022-05
// 
// 
// 0 // Sticker box
// 3 16 0 0 31 77 0 11 57 0 -31
  [3,16,0,0,31,77,0,11,57,0,-31],
// 4 16 57 0 -31 -57 0 -31 -77 0 11 0 0 31
  [4,16,57,0,-31,-57,0,-31,-77,0,11,0,0,31],
// 4 16 0 -.25 31 0 0 31 -77 0 11 -77 -.25 11
  [4,16,0,-.25,31,0,0,31,-77,0,11,-77,-.25,11],
// 4 16 0 -.25 31 77 -.25 11 77 0 11 0 0 31
  [4,16,0,-.25,31,77,-.25,11,77,0,11,0,0,31],
// 4 16 -77 -.25 11 -77 0 11 -57 0 -31 -57 -.25 -31
  [4,16,-77,-.25,11,-77,0,11,-57,0,-31,-57,-.25,-31],
// 4 16 57 -.25 -31 -57 -.25 -31 -57 0 -31 57 0 -31
  [4,16,57,-.25,-31,-57,-.25,-31,-57,0,-31,57,0,-31],
// 3 16 77 0 11 57 -.25 -31 57 0 -31
  [3,16,77,0,11,57,-.25,-31,57,0,-31],
// 3 16 77 0 11 77 -.25 11 57 -.25 -31
  [3,16,77,0,11,77,-.25,11,57,-.25,-31],
// 
// 0 BFC NOCLIP
  [0,"BFC","NOCLIP"],
// 1 0 0 -0.25 0 18 0 0 0 1 0 0 0 18 1-4chrd.dat
  [1,0,0,-0.25,0,18,0,0,0,1,0,0,0,18, ldraw_lib__1_4chrd(realsolid)],
// 1 0 0 -0.25 0 0 0 -18 0 1 0 18 0 0 1-4chrd.dat
  [1,0,0,-0.25,0,0,0,-18,0,1,0,18,0,0, ldraw_lib__1_4chrd(realsolid)],
// 1 0 0 -0.25 0 -18 0 0 0 1 0 0 0 -18 1-4chrd.dat
  [1,0,0,-0.25,0,-18,0,0,0,1,0,0,0,-18, ldraw_lib__1_4chrd(realsolid)],
// 1 0 0 -0.25 0 0 0 18 0 1 0 -18 0 0 1-4chrd.dat
  [1,0,0,-0.25,0,0,0,18,0,1,0,-18,0,0, ldraw_lib__1_4chrd(realsolid)],
// 1 25 0 -0.25 0 6 0 0 0 1 0 0 0 6 4-4ring3.dat
  [1,25,0,-0.25,0,6,0,0,0,1,0,0,0,6, ldraw_lib__4_4ring3(realsolid)],
// 4 4 2 -0.25 0 2 -0.25 7.5 -4 -0.25 7.5 -4 -0.25 -6
  [4,4,2,-0.25,0,2,-0.25,7.5,-4,-0.25,7.5,-4,-0.25,-6],
// 4 4 2 -0.25 0 -4 -0.25 -6 7.5 -0.25 -6 7.5 -0.25 0
  [4,4,2,-0.25,0,-4,-0.25,-6,7.5,-0.25,-6,7.5,-0.25,0],
// 3 15 0 -0.25 16 -16 -0.25 0 -4 -0.25 7.5
  [3,15,0,-0.25,16,-16,-0.25,0,-4,-0.25,7.5],
// 3 15 -4 -0.25 7.5 -16 -0.25 0 -4 -0.25 -6
  [3,15,-4,-0.25,7.5,-16,-0.25,0,-4,-0.25,-6],
// 3 15 -16 -0.25 0 0 -0.25 -16 -4 -0.25 -6
  [3,15,-16,-0.25,0,0,-0.25,-16,-4,-0.25,-6],
// 3 15 7.5 -0.25 -6 -4 -0.25 -6 0 -0.25 -16
  [3,15,7.5,-0.25,-6,-4,-0.25,-6,0,-0.25,-16],
// 3 15 16 -0.25 0 7.5 -0.25 -6 0 -0.25 -16
  [3,15,16,-0.25,0,7.5,-0.25,-6,0,-0.25,-16],
// 3 15 16 -0.25 0 7.5 -0.25 0 7.5 -0.25 -6
  [3,15,16,-0.25,0,7.5,-0.25,0,7.5,-0.25,-6],
// 4 15 2 -0.25 7.5 7.5 -0.25 0 16 -0.25 0 0 -0.25 16
  [4,15,2,-0.25,7.5,7.5,-0.25,0,16,-0.25,0,0,-0.25,16],
// 3 15 2 -0.25 7.5 2 -0.25 0 7.5 -0.25 0
  [3,15,2,-0.25,7.5,2,-0.25,0,7.5,-0.25,0],
// 3 15 0 -0.25 16 -4 -0.25 7.5 2 -0.25 7.5
  [3,15,0,-0.25,16,-4,-0.25,7.5,2,-0.25,7.5],
// 4 0 -16 -0.25 0 0 -0.25 16 0 -0.25 18 -18 -0.25 0
  [4,0,-16,-0.25,0,0,-0.25,16,0,-0.25,18,-18,-0.25,0],
// 4 0 0 -0.25 -16 -16 -0.25 0 -18 -0.25 0 0 -0.25 -18
  [4,0,0,-0.25,-16,-16,-0.25,0,-18,-0.25,0,0,-0.25,-18],
// 4 0 16 -0.25 0 0 -0.25 -16 0 -0.25 -18 18 -0.25 0
  [4,0,16,-0.25,0,0,-0.25,-16,0,-0.25,-18,18,-0.25,0],
// 4 0 0 -0.25 16 16 -0.25 0 18 -0.25 0 0 -0.25 18
  [4,0,0,-0.25,16,16,-0.25,0,18,-0.25,0,0,-0.25,18],
// 4 15 66 -0.25 4 25 -0.25 16 26 -0.25 10.8 63.8 -0.25 -0.2
  [4,15,66,-0.25,4,25,-0.25,16,26,-0.25,10.8,63.8,-0.25,-0.2],
// 4 15 61.6 -0.25 -4.4 27 -0.25 5.6 28 -0.25 0.4 59.4 -0.25 -8.6
  [4,15,61.6,-0.25,-4.4,27,-0.25,5.6,28,-0.25,0.4,59.4,-0.25,-8.6],
// 4 15 57.2 -0.25 -12.8 29 -0.25 -4.8 30 -0.25 -10 55 -0.25 -17
  [4,15,57.2,-0.25,-12.8,29,-0.25,-4.8,30,-0.25,-10,55,-0.25,-17],
// 4 15 -26 -0.25 10.8 -25 -0.25 16 -66 -0.25 4 -63.8 -0.25 -0.2
  [4,15,-26,-0.25,10.8,-25,-0.25,16,-66,-0.25,4,-63.8,-0.25,-0.2],
// 4 15 -28 -0.25 0.4 -27 -0.25 5.6 -61.6 -0.25 -4.4 -59.4 -0.25 -8.6
  [4,15,-28,-0.25,0.4,-27,-0.25,5.6,-61.6,-0.25,-4.4,-59.4,-0.25,-8.6],
// 4 15 -30 -0.25 -10 -29 -0.25 -4.8 -57.2 -0.25 -12.8 -55 -0.25 -17
  [4,15,-30,-0.25,-10,-29,-0.25,-4.8,-57.2,-0.25,-12.8,-55,-0.25,-17],
// 0 BFC CLIP
  [0,"BFC","CLIP"],
// 1 16 0 -0.25 0 24 0 0 0 1 0 0 0 24 4-4ndis.dat
  [1,16,0,-0.25,0,24,0,0,0,1,0,0,0,24, ldraw_lib__4_4ndis(realsolid)],
// 4 16 63.8 -0.25 -0.2 26 -0.25 10.8 27 -0.25 5.6 61.6 -0.25 -4.4
  [4,16,63.8,-0.25,-0.2,26,-0.25,10.8,27,-0.25,5.6,61.6,-0.25,-4.4],
// 4 16 59.4 -0.25 -8.6 28 -0.25 0.4 29 -0.25 -4.8 57.2 -0.25 -12.8
  [4,16,59.4,-0.25,-8.6,28,-0.25,0.4,29,-0.25,-4.8,57.2,-0.25,-12.8],
// 3 16 0 -0.25 31 0 -0.25 24 24 -0.25 24
  [3,16,0,-0.25,31,0,-0.25,24,24,-0.25,24],
// 3 16 0 -.25 31 24 -.25 24 77 -.25 11
  [3,16,0,-.25,31,24,-.25,24,77,-.25,11],
// 4 16 77 -.25 11 24 -.25 24 25 -.25 16 66 -.25 4
  [4,16,77,-.25,11,24,-.25,24,25,-.25,16,66,-.25,4],
// 3 16 77 -.25 11 66 -.25 4 63.8 -.25 -.2
  [3,16,77,-.25,11,66,-.25,4,63.8,-.25,-.2],
// 3 16 77 -.25 11 63.8 -.25 -.2 61.6 -.25 -4.4
  [3,16,77,-.25,11,63.8,-.25,-.2,61.6,-.25,-4.4],
// 4 16 77 -.25 11 61.6 -.25 -4.4 59.4 -.25 -8.6 57 -.25 -31
  [4,16,77,-.25,11,61.6,-.25,-4.4,59.4,-.25,-8.6,57,-.25,-31],
// 3 16 59.4 -.25 -8.6 57.2 -.25 -12.8 57 -.25 -31
  [3,16,59.4,-.25,-8.6,57.2,-.25,-12.8,57,-.25,-31],
// 3 16 57.2 -.25 -12.8 55 -.25 -17 57 -.25 -31
  [3,16,57.2,-.25,-12.8,55,-.25,-17,57,-.25,-31],
// 4 16 57 -.25 -31 55 -.25 -17 30 -.25 -10 24 -.25 -24
  [4,16,57,-.25,-31,55,-.25,-17,30,-.25,-10,24,-.25,-24],
// 4 16 24 -0.25 -24 30 -0.25 -10 29 -0.25 -4.8 24 -0.25 0
  [4,16,24,-0.25,-24,30,-0.25,-10,29,-0.25,-4.8,24,-0.25,0],
// 3 16 28 -0.25 0.4 24 -0.25 0 29 -0.25 -4.8
  [3,16,28,-0.25,0.4,24,-0.25,0,29,-0.25,-4.8],
// 3 16 27 -0.25 5.6 24 -0.25 0 28 -0.25 0.4
  [3,16,27,-0.25,5.6,24,-0.25,0,28,-0.25,0.4],
// 3 16 26 -0.25 10.8 24 -0.25 0 27 -0.25 5.6
  [3,16,26,-0.25,10.8,24,-0.25,0,27,-0.25,5.6],
// 3 16 25 -0.25 16 24 -0.25 0 26 -0.25 10.8
  [3,16,25,-0.25,16,24,-0.25,0,26,-0.25,10.8],
// 3 16 24 -0.25 24 24 -0.25 0 25 -0.25 16
  [3,16,24,-0.25,24,24,-0.25,0,25,-0.25,16],
// 4 16 57 -.25 -31 24 -.25 -24 0 -.25 -24 -57 -.25 -31
  [4,16,57,-.25,-31,24,-.25,-24,0,-.25,-24,-57,-.25,-31],
// 4 16 -27 -0.25 5.6 -26 -0.25 10.8 -63.8 -0.25 -0.2 -61.6 -0.25 -4.4
  [4,16,-27,-0.25,5.6,-26,-0.25,10.8,-63.8,-0.25,-0.2,-61.6,-0.25,-4.4],
// 4 16 -29 -0.25 -4.8 -28 -0.25 0.4 -59.4 -0.25 -8.6 -57.2 -0.25 -12.8
  [4,16,-29,-0.25,-4.8,-28,-0.25,0.4,-59.4,-0.25,-8.6,-57.2,-0.25,-12.8],
// 3 16 0 -0.25 31 -24 -0.25 24 0 -0.25 24
  [3,16,0,-0.25,31,-24,-0.25,24,0,-0.25,24],
// 3 16 0 -.25 31 -77 -.25 11 -24 -.25 24
  [3,16,0,-.25,31,-77,-.25,11,-24,-.25,24],
// 4 16 -25 -.25 16 -24 -.25 24 -77 -.25 11 -66 -.25 4
  [4,16,-25,-.25,16,-24,-.25,24,-77,-.25,11,-66,-.25,4],
// 3 16 -77 -.25 11 -63.8 -.25 -.2 -66 -.25 4
  [3,16,-77,-.25,11,-63.8,-.25,-.2,-66,-.25,4],
// 3 16 -77 -.25 11 -61.6 -.25 -4.4 -63.8 -.25 -.2
  [3,16,-77,-.25,11,-61.6,-.25,-4.4,-63.8,-.25,-.2],
// 4 16 -59.4 -.25 -8.6 -61.6 -.25 -4.4 -77 -.25 11 -57 -.25 -31
  [4,16,-59.4,-.25,-8.6,-61.6,-.25,-4.4,-77,-.25,11,-57,-.25,-31],
// 3 16 -59.4 -.25 -8.6 -57 -.25 -31 -57.2 -.25 -12.8
  [3,16,-59.4,-.25,-8.6,-57,-.25,-31,-57.2,-.25,-12.8],
// 3 16 -57.2 -.25 -12.8 -57 -.25 -31 -55 -.25 -17
  [3,16,-57.2,-.25,-12.8,-57,-.25,-31,-55,-.25,-17],
// 4 16 -30 -.25 -10 -55 -.25 -17 -57 -.25 -31 -24 -.25 -24
  [4,16,-30,-.25,-10,-55,-.25,-17,-57,-.25,-31,-24,-.25,-24],
// 4 16 -29 -0.25 -4.8 -30 -0.25 -10 -24 -0.25 -24 -24 -0.25 0
  [4,16,-29,-0.25,-4.8,-30,-0.25,-10,-24,-0.25,-24,-24,-0.25,0],
// 3 16 -28 -0.25 0.4 -29 -0.25 -4.8 -24 -0.25 0
  [3,16,-28,-0.25,0.4,-29,-0.25,-4.8,-24,-0.25,0],
// 3 16 -27 -0.25 5.6 -28 -0.25 0.4 -24 -0.25 0
  [3,16,-27,-0.25,5.6,-28,-0.25,0.4,-24,-0.25,0],
// 3 16 -26 -0.25 10.8 -27 -0.25 5.6 -24 -0.25 0
  [3,16,-26,-0.25,10.8,-27,-0.25,5.6,-24,-0.25,0],
// 3 16 -25 -0.25 16 -26 -0.25 10.8 -24 -0.25 0
  [3,16,-25,-0.25,16,-26,-0.25,10.8,-24,-0.25,0],
// 3 16 -24 -0.25 24 -25 -0.25 16 -24 -0.25 0
  [3,16,-24,-0.25,24,-25,-0.25,16,-24,-0.25,0],
// 3 16 0 -.25 -24 -24 -.25 -24 -57 -.25 -31
  [3,16,0,-.25,-24,-24,-.25,-24,-57,-.25,-31],
];
module ldraw_lib__194175a(step=0, col=false, unit=2/5, alt=false, line=0.2, solid=!$preview)
    makepoly(ldraw_lib__194175a(solid), step=step, col=col, unit=unit, alt=alt, line=line, solid=solid);
ldraw_lib__194175a(line=0.2);
